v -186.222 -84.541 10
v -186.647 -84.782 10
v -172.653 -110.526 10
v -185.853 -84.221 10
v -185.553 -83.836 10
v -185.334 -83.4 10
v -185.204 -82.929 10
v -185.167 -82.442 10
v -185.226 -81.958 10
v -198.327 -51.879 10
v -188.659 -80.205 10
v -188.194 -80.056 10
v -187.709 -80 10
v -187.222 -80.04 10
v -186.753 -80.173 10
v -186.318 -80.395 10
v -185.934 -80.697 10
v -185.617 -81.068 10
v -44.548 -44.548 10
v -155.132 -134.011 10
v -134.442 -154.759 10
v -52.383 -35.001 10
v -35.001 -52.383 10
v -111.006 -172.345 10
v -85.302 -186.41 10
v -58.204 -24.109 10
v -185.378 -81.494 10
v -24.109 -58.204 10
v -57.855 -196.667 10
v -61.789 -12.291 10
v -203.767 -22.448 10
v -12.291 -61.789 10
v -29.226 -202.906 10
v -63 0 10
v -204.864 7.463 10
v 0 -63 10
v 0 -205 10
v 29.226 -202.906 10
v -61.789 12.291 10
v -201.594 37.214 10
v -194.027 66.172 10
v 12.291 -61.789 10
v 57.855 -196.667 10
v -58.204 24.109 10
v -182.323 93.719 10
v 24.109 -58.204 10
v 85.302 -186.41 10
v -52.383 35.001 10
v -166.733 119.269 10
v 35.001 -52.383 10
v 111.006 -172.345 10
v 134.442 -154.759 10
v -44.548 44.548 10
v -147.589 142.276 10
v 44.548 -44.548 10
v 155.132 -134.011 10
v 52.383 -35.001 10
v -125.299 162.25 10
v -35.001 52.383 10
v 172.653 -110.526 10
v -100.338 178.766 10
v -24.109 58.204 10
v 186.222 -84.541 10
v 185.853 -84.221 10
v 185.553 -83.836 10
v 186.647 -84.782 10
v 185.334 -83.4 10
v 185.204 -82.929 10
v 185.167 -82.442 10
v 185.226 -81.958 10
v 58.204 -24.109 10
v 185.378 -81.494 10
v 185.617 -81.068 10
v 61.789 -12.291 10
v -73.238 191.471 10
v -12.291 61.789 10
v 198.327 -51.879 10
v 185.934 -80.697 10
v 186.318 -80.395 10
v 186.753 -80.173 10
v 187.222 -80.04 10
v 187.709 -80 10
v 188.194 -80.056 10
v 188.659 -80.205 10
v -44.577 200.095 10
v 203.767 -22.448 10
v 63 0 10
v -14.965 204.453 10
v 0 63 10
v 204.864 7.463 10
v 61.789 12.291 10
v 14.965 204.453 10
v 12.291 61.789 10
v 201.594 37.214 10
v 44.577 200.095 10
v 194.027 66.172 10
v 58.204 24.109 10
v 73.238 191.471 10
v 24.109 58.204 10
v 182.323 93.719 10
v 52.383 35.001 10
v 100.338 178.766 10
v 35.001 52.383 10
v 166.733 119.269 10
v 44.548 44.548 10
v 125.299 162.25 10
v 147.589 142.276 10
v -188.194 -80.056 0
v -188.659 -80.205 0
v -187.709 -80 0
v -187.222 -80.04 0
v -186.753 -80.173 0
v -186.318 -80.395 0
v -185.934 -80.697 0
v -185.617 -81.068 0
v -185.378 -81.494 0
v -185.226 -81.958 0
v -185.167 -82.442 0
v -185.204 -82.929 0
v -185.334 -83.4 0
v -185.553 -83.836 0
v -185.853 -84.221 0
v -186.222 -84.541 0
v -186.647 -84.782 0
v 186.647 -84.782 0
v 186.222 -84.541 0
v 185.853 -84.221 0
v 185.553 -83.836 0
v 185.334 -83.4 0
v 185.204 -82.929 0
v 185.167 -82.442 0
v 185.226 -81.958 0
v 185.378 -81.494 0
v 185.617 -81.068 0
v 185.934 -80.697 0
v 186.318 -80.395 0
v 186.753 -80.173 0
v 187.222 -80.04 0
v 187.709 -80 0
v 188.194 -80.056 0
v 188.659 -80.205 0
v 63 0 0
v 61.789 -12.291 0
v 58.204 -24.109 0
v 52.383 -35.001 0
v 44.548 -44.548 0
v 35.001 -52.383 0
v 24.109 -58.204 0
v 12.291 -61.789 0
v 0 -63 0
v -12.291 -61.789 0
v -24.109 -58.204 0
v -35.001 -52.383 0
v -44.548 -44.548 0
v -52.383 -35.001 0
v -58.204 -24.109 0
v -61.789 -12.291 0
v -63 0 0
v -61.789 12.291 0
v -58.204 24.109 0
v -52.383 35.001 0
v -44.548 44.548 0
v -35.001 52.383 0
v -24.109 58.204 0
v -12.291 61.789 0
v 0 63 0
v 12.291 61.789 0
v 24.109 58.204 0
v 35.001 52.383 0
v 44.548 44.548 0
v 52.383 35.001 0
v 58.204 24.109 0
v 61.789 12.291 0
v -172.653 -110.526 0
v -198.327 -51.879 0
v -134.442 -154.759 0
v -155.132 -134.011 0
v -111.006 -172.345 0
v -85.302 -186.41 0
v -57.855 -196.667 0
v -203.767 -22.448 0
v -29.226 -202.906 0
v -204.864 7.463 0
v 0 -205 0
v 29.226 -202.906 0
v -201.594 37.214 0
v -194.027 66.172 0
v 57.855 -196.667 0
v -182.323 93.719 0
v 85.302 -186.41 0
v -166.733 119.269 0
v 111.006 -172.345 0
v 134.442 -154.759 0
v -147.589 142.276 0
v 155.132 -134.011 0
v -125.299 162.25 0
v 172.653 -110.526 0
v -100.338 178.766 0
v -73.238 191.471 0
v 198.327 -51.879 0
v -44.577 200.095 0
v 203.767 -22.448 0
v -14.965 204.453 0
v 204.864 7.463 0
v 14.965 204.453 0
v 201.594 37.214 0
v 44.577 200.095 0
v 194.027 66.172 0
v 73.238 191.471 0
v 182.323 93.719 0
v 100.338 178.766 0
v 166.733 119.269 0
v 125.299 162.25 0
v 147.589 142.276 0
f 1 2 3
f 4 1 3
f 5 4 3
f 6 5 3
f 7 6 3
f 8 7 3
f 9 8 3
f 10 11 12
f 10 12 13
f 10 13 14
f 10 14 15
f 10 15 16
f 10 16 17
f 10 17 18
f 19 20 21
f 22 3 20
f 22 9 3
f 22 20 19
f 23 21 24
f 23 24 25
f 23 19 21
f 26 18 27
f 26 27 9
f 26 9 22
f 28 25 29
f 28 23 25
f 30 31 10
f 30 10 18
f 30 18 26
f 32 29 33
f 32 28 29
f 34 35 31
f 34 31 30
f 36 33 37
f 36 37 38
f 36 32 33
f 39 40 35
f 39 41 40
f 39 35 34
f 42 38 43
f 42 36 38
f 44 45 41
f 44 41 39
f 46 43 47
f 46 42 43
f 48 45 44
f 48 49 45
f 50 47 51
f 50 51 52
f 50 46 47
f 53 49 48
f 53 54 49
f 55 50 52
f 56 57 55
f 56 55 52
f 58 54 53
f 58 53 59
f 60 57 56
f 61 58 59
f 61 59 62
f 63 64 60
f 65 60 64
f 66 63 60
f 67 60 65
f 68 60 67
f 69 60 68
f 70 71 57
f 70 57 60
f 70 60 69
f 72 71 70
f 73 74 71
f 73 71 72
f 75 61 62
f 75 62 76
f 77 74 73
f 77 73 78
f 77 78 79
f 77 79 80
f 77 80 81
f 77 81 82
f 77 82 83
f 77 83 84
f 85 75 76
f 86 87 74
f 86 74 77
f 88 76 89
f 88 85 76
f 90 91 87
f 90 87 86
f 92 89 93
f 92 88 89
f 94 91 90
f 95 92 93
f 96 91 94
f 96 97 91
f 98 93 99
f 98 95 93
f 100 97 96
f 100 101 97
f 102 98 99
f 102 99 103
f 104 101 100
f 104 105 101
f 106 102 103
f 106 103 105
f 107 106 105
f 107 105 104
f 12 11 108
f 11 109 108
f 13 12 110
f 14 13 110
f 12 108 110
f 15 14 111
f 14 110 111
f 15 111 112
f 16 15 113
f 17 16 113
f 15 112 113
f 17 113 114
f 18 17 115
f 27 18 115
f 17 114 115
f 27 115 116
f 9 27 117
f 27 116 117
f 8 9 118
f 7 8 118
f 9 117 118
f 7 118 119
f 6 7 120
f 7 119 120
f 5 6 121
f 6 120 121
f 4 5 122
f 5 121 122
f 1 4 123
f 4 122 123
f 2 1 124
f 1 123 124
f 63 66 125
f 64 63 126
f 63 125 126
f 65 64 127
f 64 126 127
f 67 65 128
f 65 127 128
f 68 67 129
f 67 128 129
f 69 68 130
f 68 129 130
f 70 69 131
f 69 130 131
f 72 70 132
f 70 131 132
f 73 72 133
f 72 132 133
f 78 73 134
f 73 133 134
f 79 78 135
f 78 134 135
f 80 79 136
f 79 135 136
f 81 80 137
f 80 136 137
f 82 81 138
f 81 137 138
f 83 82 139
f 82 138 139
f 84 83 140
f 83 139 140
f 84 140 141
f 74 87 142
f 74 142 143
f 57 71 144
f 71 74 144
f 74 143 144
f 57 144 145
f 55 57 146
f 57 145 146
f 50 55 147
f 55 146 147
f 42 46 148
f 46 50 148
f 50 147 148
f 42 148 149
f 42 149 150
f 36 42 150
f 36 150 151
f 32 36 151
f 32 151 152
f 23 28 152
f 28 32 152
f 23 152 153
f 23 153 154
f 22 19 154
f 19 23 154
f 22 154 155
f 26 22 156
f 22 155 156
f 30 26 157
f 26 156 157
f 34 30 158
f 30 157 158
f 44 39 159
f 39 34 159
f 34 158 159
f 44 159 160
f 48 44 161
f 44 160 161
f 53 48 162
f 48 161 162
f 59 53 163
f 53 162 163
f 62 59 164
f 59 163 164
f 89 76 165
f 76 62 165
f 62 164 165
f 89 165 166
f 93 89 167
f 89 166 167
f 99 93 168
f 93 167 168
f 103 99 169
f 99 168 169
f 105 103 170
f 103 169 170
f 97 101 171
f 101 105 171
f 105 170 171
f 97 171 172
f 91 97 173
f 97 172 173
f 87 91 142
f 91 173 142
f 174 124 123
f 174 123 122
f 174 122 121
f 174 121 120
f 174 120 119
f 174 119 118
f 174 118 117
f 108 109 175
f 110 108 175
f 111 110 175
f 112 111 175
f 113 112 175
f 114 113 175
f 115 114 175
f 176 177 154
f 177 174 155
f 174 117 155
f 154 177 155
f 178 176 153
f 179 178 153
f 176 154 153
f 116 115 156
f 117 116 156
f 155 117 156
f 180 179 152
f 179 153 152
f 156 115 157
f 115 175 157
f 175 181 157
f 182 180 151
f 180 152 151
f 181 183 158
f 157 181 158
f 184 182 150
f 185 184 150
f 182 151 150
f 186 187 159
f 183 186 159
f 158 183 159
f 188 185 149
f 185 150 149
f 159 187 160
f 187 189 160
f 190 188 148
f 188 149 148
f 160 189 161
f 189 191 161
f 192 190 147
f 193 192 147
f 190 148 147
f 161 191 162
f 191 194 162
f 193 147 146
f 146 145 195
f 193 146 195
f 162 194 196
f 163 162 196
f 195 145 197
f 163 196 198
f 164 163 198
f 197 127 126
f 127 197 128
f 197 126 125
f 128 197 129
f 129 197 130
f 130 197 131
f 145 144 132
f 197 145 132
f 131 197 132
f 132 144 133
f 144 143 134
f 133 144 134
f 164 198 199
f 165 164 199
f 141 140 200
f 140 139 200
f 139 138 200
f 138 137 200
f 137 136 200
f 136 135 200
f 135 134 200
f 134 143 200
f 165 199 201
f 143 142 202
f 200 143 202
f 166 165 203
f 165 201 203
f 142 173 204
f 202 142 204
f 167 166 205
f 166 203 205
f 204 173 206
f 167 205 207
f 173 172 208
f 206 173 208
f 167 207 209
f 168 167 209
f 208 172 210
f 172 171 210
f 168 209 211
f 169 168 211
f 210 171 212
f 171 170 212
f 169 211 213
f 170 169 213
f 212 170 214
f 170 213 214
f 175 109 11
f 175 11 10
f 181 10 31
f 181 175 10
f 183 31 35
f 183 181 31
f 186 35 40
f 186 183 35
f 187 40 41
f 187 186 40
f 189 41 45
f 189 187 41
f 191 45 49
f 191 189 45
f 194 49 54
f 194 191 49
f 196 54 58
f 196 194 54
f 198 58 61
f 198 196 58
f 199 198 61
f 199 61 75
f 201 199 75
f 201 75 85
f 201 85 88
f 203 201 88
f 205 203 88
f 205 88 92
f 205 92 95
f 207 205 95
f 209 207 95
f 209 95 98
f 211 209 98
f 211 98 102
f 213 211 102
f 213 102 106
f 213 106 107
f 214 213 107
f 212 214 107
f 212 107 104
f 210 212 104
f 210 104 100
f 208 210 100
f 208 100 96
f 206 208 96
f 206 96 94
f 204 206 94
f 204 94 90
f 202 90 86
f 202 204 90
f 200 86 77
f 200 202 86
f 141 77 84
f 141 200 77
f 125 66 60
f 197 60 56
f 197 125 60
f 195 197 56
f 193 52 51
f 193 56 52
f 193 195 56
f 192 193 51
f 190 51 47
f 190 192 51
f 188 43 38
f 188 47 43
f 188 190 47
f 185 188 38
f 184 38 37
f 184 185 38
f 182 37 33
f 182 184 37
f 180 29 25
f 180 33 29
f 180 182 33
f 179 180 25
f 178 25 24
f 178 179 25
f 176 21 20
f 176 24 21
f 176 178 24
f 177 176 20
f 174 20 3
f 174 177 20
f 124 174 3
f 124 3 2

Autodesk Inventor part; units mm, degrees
ref_plane "YZ Plane" through (0, 0, 0) normal (1, 0, 0) x (0, 1, 0)
ref_plane "XZ Plane" through (0, 0, 0) normal (0, 1, 0) x (-1, 0, 0)
ref_plane "XY Plane" through (0, 0, 0) normal (0, 0, 1) x (1, 0, 0)
sketch "Sketch1" plane through (0, 0, 0) normal (0, 0, 1) x (1, 0, 0)
  circle A0 centre (0, 0) radius 195 construction
  circle A1 centre (0, 0) radius 205
  circle A2 centre (0, 0) radius 63
  dimension "d0" = 390
  dimension "d4" = 126
  dimension "d13" = 10
extrude "Extrusion1" add sketch "Sketch1" along normal blind 10
sketch "Sketch3" plane through (0, 0, 0) normal (0, 0, -1) x (-1, 0, 0)
  circle A0 centre (0, 0) radius 205 construction
  circle A1 centre (-187.6666, -82.5) radius 2.5
  circle A2 centre (187.6666, -82.5) radius 2.5
  line L0 (-187.6666, -82.5) -> (187.6666, -82.5) construction
  dimension "d14" = 5
  dimension "d15" = 82.5
extrude "Extrusion3" cut sketch "Sketch3" against normal through all
equation "\"d0\" = Шпил_пласт_НОС_диам_центров"
equation "\"d4\" = Стенка_НОС_диам_илоотвод"
equation "\"d2\" = Thickness"
equation "\"BendReliefDepth\" = 0.5 * Thickness"
equation "\"Шпил_пласт_НОС_диам_центров\" = 390"
equation "\"Стенка_НОС_диам_илоотвод\" = 126"
equation "\"Thickness\" = 10"
properties part number "ДМФ 032 крышка Нос"
